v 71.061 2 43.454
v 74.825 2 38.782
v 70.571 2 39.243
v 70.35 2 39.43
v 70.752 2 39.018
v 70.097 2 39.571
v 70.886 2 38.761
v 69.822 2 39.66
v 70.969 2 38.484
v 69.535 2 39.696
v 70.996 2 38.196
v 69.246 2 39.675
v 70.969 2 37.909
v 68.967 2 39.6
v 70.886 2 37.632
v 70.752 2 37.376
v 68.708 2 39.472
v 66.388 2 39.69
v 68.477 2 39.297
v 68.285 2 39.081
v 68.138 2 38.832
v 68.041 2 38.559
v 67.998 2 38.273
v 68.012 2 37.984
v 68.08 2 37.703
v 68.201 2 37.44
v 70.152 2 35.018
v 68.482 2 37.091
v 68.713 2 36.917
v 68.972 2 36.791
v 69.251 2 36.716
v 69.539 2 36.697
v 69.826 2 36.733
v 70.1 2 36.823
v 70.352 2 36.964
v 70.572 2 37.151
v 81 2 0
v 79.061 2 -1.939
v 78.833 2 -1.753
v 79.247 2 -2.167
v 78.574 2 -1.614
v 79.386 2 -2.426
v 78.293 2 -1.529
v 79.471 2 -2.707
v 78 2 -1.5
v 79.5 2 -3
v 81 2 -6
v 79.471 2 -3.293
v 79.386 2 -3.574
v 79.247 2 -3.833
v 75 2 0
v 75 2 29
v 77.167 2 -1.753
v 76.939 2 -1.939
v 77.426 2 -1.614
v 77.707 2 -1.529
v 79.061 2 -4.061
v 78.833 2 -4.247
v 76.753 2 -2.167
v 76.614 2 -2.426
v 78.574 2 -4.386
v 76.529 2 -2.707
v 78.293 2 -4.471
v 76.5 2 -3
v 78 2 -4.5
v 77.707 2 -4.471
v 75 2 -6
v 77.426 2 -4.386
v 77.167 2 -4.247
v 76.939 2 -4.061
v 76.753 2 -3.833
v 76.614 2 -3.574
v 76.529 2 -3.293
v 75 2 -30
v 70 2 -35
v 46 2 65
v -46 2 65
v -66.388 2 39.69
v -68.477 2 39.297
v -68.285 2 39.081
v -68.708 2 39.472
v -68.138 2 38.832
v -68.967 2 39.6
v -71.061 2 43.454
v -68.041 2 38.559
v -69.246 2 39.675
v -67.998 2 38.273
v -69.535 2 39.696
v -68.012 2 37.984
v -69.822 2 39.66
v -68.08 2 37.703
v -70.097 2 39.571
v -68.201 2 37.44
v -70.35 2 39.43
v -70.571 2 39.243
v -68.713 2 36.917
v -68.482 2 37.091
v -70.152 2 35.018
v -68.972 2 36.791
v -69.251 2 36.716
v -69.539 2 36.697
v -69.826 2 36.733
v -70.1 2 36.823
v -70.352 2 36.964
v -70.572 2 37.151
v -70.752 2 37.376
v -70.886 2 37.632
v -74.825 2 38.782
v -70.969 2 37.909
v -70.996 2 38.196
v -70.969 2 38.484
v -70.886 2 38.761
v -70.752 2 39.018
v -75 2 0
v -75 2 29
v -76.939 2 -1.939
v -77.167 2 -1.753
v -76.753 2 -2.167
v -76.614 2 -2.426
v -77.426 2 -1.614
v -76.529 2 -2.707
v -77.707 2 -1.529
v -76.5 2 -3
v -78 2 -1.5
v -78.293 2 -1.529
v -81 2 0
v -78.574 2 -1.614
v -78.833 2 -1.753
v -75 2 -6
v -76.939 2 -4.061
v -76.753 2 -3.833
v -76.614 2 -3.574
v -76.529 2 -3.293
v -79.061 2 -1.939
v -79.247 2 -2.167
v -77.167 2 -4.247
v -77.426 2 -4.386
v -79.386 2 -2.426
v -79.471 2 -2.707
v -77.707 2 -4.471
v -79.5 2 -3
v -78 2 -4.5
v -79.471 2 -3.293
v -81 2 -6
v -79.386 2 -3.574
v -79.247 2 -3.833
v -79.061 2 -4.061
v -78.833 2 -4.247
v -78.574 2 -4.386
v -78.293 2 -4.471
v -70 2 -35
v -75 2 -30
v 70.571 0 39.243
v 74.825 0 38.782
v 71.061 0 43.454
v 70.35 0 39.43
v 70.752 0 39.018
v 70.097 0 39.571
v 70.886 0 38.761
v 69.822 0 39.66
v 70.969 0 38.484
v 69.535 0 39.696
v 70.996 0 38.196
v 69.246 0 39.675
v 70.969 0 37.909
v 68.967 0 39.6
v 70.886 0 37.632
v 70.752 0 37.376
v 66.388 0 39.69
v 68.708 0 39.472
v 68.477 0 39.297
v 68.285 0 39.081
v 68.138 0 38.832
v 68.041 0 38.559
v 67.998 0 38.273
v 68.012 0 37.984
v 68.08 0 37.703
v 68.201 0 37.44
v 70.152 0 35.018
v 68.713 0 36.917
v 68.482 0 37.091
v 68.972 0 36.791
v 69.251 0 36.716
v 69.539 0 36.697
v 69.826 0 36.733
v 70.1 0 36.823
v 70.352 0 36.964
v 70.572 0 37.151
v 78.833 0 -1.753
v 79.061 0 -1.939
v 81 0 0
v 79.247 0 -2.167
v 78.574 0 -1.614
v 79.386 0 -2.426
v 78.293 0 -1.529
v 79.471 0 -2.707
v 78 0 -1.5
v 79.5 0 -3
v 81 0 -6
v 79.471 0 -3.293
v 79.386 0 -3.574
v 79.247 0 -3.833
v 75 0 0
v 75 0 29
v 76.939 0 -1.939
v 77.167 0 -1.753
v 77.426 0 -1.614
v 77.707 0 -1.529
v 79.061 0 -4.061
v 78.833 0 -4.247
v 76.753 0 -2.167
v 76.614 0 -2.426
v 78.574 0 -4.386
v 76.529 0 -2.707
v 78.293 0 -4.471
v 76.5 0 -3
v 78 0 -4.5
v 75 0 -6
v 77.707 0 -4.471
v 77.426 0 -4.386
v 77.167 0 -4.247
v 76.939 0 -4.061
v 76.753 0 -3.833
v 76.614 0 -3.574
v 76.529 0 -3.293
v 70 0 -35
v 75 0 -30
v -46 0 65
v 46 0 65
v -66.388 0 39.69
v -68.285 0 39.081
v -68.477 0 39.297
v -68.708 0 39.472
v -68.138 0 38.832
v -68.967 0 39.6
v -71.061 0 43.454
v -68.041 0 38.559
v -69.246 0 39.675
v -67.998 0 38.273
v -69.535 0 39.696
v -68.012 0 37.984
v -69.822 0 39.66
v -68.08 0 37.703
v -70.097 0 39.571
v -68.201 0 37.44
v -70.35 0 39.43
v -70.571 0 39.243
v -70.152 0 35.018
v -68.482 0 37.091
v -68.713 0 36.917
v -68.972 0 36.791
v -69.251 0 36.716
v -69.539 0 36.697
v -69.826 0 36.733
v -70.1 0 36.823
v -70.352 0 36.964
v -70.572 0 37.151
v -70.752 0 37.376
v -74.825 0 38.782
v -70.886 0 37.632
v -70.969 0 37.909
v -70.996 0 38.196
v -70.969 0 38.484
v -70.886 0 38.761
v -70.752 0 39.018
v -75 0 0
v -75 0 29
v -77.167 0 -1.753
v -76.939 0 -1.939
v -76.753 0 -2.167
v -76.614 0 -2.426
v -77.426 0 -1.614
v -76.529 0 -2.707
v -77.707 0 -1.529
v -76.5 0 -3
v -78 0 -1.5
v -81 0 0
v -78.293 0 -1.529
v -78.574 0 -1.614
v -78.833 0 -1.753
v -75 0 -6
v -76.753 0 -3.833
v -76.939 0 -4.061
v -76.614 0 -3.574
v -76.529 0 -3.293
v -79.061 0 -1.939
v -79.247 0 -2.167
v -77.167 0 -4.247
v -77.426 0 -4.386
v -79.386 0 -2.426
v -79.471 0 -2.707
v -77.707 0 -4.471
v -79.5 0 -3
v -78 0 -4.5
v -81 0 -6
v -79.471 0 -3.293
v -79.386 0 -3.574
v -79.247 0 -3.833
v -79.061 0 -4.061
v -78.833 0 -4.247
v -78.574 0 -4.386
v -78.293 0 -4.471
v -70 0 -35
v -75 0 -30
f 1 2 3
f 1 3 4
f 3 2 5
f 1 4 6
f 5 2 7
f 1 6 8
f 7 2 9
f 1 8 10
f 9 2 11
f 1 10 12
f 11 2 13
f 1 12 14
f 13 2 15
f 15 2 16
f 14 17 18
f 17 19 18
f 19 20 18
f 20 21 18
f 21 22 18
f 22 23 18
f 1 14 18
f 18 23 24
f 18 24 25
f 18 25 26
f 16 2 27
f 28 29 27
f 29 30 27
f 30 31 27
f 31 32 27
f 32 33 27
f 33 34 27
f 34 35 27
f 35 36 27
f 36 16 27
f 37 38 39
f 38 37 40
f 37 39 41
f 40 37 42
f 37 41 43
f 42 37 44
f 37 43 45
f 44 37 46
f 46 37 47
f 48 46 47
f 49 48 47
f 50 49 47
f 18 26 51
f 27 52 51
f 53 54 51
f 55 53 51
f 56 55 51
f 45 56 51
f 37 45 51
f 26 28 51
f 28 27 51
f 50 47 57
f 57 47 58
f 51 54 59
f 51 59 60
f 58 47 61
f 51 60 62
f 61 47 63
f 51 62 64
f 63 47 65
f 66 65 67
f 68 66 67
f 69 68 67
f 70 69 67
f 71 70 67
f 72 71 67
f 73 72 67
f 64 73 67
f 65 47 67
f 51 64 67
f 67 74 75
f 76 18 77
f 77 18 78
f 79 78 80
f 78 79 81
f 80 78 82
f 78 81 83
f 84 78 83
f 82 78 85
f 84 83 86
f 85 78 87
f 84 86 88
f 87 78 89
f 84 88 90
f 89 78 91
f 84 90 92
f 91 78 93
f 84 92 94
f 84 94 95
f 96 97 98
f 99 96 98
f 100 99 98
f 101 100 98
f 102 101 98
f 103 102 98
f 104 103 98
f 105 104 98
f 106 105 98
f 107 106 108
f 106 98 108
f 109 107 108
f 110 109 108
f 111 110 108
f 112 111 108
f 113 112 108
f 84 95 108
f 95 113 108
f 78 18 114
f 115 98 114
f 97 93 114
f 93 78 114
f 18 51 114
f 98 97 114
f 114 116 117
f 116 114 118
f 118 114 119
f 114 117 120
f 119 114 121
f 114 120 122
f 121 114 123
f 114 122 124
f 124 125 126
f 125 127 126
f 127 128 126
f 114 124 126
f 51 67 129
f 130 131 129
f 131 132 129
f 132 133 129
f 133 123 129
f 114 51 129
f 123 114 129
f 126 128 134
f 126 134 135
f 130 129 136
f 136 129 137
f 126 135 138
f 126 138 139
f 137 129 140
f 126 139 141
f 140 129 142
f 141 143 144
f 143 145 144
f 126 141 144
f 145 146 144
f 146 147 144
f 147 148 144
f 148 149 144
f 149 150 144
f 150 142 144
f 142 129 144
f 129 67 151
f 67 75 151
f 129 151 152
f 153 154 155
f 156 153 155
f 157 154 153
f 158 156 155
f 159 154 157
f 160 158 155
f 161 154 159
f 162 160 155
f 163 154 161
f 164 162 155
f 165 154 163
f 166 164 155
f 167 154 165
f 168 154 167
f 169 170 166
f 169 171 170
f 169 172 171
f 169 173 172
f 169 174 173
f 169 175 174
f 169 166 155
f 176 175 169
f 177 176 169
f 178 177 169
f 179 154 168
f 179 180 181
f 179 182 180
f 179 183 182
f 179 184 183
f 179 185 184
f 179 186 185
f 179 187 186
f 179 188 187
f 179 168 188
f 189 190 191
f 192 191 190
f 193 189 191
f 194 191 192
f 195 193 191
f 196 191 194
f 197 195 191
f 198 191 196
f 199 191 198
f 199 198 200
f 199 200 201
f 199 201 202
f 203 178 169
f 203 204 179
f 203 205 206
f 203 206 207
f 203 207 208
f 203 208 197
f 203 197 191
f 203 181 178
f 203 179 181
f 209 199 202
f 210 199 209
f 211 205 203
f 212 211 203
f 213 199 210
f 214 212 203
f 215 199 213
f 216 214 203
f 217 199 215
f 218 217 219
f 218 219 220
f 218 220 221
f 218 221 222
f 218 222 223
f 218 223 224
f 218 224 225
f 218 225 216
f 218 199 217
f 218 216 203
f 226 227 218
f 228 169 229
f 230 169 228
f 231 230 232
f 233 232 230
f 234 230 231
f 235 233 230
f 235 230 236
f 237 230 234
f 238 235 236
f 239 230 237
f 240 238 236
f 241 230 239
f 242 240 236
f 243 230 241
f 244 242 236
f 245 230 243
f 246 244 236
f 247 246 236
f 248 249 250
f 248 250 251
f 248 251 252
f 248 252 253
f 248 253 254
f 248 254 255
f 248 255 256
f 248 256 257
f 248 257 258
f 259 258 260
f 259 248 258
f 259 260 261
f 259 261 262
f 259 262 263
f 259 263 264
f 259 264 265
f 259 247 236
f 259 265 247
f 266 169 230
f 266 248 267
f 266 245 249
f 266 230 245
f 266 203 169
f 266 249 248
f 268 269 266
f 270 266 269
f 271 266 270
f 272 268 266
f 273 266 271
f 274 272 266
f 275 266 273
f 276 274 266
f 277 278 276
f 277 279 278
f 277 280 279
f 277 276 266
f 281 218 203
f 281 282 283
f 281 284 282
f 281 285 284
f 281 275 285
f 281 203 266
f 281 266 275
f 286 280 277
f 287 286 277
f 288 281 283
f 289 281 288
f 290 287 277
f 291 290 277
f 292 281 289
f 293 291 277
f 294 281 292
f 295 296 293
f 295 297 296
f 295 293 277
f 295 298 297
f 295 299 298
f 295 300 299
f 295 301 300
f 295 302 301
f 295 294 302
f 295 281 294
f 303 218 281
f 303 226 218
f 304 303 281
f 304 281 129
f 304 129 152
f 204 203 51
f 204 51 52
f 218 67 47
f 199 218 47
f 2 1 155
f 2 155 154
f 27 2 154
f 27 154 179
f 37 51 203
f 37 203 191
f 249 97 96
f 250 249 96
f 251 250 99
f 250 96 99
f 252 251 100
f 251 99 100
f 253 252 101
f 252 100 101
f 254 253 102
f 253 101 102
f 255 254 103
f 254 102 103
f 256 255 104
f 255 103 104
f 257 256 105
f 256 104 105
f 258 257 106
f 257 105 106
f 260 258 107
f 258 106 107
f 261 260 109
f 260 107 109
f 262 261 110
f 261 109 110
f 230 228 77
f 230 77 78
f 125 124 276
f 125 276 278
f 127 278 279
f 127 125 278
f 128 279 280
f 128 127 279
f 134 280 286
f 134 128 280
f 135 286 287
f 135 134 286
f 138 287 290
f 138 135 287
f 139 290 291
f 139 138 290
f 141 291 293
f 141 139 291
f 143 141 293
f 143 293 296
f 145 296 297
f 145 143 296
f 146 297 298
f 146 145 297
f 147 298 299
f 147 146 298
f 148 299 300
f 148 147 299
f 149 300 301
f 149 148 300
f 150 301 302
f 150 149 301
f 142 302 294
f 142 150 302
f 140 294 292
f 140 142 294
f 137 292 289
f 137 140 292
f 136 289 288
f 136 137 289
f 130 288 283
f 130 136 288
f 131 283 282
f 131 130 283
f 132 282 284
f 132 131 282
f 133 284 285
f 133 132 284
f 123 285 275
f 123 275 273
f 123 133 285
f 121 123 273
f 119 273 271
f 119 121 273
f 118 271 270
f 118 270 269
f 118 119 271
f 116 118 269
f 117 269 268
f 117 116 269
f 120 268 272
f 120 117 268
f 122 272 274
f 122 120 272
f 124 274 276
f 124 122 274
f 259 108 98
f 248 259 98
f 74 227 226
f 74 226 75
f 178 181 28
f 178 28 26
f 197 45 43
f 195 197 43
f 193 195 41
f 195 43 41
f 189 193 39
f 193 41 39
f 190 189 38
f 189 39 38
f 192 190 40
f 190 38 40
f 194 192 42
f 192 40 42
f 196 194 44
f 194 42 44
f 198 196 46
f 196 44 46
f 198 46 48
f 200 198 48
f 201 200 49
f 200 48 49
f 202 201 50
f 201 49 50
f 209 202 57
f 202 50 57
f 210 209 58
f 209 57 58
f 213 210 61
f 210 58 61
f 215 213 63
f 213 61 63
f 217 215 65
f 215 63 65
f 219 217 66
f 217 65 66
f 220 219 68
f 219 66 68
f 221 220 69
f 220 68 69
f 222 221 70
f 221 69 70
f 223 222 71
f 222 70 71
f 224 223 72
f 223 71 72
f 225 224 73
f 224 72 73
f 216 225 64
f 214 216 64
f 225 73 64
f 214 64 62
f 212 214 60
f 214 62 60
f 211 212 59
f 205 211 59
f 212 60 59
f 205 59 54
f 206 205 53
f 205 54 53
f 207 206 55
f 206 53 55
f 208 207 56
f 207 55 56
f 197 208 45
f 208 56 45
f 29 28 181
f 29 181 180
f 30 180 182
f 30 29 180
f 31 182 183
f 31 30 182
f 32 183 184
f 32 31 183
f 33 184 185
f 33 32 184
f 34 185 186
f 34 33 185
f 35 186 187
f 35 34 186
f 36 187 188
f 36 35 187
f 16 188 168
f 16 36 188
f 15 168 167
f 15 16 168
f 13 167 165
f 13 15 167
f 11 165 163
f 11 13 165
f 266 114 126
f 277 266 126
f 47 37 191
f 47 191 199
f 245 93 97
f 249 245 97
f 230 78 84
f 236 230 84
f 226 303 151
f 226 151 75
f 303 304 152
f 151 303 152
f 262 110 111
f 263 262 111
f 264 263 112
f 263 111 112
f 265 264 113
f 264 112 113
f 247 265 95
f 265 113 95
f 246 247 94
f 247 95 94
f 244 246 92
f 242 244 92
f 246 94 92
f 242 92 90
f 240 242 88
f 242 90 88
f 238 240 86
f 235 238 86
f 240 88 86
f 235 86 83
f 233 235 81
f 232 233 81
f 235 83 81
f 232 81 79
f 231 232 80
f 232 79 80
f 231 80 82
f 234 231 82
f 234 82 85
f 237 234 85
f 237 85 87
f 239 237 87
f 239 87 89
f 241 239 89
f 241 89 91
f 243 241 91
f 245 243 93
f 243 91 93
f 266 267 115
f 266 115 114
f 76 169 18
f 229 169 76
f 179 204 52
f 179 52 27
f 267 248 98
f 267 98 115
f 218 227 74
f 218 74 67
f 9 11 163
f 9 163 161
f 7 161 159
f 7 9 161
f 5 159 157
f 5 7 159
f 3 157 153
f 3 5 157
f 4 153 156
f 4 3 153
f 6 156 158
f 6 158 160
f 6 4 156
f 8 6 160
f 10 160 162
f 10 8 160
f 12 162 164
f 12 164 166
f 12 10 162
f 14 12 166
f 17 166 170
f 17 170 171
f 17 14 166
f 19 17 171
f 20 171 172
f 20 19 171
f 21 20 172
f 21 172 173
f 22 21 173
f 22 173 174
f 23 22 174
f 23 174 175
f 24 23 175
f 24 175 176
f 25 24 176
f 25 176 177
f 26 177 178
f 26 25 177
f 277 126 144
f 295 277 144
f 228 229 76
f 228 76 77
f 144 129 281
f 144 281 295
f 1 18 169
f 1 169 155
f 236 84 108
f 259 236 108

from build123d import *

# Parameters (mm, degrees)
EXTRUDE1_DEPTH = 2
SKETCH3_W      = 6
SKETCH3_H      = 6
SKETCH3_R      = 1.5
EXTRUDE2_DEPTH = 2
CHAMFER2_SIZE  = 5


with BuildPart() as part:
    # Sketch1 → Extrude1 (new body)
    with BuildSketch(Plane(origin=(0, 0, 0), x_dir=(1, 0, 0), z_dir=(0, 1, 0))):
        Polygon((-75, 35), (75, 35), (75, -29), (46, -65), (-46, -65), (-75, -29), align=None)
    extrude(amount=EXTRUDE1_DEPTH)

    # Sketch3 → Extrude2 (add)
    # profile 1 of 2: a face of its own
    with BuildSketch(Plane(origin=(0, 2, 0), x_dir=(1, 0, 0), z_dir=(0, 1, 0))):
        with Locations((78, 3)):
            Rectangle(SKETCH3_W, SKETCH3_H)
        with Locations(Location((78, 3, 0), (0, 0, 270))):
            Circle(SKETCH3_R, mode=Mode.SUBTRACT)
    # profile 2 of 2: a face of its own
    with BuildSketch(Plane(origin=(0, 2, 0), x_dir=(1, 0, 0), z_dir=(0, 1, 0))):
        with BuildLine():
            Line((74.824710663, -38.781951728), (70.152187208, -35.0179745))
            Line((70.152187208, -35.0179745), (68.482047894, -37.09125089))
            ThreePointArc((68.482047894, -37.09125089), (70.09994245, -36.822977113), (70.99646032, -38.19622484))
            ThreePointArc((70.99646032, -38.19622484), (69.104945526, -39.644229041), (68.200838766, -37.440338084))
            Line((68.200838766, -37.440338084), (66.388209981, -39.690497955))
            Line((66.388209981, -39.690497955), (71.060733435, -43.454475182))
            Line((71.060733435, -43.454475182), (74.824710663, -38.781951728))
        make_face()
    extrude2 = extrude(amount=-EXTRUDE2_DEPTH)

    # Chamfer2
    chamfer2_edges = [part.edges().sort_by_distance(p)[0] for p in [
        (-75, 1, -35),
        (75, 1, -35),
    ]]
    chamfer(chamfer2_edges, length=CHAMFER2_SIZE)

    # Mirror1: Extrude2 across plane
    add(extrude2.mirror(Plane(origin=(0, 0, 0), x_dir=(0, 0, 1), z_dir=(1, 0, 0))))


solid = part.part
